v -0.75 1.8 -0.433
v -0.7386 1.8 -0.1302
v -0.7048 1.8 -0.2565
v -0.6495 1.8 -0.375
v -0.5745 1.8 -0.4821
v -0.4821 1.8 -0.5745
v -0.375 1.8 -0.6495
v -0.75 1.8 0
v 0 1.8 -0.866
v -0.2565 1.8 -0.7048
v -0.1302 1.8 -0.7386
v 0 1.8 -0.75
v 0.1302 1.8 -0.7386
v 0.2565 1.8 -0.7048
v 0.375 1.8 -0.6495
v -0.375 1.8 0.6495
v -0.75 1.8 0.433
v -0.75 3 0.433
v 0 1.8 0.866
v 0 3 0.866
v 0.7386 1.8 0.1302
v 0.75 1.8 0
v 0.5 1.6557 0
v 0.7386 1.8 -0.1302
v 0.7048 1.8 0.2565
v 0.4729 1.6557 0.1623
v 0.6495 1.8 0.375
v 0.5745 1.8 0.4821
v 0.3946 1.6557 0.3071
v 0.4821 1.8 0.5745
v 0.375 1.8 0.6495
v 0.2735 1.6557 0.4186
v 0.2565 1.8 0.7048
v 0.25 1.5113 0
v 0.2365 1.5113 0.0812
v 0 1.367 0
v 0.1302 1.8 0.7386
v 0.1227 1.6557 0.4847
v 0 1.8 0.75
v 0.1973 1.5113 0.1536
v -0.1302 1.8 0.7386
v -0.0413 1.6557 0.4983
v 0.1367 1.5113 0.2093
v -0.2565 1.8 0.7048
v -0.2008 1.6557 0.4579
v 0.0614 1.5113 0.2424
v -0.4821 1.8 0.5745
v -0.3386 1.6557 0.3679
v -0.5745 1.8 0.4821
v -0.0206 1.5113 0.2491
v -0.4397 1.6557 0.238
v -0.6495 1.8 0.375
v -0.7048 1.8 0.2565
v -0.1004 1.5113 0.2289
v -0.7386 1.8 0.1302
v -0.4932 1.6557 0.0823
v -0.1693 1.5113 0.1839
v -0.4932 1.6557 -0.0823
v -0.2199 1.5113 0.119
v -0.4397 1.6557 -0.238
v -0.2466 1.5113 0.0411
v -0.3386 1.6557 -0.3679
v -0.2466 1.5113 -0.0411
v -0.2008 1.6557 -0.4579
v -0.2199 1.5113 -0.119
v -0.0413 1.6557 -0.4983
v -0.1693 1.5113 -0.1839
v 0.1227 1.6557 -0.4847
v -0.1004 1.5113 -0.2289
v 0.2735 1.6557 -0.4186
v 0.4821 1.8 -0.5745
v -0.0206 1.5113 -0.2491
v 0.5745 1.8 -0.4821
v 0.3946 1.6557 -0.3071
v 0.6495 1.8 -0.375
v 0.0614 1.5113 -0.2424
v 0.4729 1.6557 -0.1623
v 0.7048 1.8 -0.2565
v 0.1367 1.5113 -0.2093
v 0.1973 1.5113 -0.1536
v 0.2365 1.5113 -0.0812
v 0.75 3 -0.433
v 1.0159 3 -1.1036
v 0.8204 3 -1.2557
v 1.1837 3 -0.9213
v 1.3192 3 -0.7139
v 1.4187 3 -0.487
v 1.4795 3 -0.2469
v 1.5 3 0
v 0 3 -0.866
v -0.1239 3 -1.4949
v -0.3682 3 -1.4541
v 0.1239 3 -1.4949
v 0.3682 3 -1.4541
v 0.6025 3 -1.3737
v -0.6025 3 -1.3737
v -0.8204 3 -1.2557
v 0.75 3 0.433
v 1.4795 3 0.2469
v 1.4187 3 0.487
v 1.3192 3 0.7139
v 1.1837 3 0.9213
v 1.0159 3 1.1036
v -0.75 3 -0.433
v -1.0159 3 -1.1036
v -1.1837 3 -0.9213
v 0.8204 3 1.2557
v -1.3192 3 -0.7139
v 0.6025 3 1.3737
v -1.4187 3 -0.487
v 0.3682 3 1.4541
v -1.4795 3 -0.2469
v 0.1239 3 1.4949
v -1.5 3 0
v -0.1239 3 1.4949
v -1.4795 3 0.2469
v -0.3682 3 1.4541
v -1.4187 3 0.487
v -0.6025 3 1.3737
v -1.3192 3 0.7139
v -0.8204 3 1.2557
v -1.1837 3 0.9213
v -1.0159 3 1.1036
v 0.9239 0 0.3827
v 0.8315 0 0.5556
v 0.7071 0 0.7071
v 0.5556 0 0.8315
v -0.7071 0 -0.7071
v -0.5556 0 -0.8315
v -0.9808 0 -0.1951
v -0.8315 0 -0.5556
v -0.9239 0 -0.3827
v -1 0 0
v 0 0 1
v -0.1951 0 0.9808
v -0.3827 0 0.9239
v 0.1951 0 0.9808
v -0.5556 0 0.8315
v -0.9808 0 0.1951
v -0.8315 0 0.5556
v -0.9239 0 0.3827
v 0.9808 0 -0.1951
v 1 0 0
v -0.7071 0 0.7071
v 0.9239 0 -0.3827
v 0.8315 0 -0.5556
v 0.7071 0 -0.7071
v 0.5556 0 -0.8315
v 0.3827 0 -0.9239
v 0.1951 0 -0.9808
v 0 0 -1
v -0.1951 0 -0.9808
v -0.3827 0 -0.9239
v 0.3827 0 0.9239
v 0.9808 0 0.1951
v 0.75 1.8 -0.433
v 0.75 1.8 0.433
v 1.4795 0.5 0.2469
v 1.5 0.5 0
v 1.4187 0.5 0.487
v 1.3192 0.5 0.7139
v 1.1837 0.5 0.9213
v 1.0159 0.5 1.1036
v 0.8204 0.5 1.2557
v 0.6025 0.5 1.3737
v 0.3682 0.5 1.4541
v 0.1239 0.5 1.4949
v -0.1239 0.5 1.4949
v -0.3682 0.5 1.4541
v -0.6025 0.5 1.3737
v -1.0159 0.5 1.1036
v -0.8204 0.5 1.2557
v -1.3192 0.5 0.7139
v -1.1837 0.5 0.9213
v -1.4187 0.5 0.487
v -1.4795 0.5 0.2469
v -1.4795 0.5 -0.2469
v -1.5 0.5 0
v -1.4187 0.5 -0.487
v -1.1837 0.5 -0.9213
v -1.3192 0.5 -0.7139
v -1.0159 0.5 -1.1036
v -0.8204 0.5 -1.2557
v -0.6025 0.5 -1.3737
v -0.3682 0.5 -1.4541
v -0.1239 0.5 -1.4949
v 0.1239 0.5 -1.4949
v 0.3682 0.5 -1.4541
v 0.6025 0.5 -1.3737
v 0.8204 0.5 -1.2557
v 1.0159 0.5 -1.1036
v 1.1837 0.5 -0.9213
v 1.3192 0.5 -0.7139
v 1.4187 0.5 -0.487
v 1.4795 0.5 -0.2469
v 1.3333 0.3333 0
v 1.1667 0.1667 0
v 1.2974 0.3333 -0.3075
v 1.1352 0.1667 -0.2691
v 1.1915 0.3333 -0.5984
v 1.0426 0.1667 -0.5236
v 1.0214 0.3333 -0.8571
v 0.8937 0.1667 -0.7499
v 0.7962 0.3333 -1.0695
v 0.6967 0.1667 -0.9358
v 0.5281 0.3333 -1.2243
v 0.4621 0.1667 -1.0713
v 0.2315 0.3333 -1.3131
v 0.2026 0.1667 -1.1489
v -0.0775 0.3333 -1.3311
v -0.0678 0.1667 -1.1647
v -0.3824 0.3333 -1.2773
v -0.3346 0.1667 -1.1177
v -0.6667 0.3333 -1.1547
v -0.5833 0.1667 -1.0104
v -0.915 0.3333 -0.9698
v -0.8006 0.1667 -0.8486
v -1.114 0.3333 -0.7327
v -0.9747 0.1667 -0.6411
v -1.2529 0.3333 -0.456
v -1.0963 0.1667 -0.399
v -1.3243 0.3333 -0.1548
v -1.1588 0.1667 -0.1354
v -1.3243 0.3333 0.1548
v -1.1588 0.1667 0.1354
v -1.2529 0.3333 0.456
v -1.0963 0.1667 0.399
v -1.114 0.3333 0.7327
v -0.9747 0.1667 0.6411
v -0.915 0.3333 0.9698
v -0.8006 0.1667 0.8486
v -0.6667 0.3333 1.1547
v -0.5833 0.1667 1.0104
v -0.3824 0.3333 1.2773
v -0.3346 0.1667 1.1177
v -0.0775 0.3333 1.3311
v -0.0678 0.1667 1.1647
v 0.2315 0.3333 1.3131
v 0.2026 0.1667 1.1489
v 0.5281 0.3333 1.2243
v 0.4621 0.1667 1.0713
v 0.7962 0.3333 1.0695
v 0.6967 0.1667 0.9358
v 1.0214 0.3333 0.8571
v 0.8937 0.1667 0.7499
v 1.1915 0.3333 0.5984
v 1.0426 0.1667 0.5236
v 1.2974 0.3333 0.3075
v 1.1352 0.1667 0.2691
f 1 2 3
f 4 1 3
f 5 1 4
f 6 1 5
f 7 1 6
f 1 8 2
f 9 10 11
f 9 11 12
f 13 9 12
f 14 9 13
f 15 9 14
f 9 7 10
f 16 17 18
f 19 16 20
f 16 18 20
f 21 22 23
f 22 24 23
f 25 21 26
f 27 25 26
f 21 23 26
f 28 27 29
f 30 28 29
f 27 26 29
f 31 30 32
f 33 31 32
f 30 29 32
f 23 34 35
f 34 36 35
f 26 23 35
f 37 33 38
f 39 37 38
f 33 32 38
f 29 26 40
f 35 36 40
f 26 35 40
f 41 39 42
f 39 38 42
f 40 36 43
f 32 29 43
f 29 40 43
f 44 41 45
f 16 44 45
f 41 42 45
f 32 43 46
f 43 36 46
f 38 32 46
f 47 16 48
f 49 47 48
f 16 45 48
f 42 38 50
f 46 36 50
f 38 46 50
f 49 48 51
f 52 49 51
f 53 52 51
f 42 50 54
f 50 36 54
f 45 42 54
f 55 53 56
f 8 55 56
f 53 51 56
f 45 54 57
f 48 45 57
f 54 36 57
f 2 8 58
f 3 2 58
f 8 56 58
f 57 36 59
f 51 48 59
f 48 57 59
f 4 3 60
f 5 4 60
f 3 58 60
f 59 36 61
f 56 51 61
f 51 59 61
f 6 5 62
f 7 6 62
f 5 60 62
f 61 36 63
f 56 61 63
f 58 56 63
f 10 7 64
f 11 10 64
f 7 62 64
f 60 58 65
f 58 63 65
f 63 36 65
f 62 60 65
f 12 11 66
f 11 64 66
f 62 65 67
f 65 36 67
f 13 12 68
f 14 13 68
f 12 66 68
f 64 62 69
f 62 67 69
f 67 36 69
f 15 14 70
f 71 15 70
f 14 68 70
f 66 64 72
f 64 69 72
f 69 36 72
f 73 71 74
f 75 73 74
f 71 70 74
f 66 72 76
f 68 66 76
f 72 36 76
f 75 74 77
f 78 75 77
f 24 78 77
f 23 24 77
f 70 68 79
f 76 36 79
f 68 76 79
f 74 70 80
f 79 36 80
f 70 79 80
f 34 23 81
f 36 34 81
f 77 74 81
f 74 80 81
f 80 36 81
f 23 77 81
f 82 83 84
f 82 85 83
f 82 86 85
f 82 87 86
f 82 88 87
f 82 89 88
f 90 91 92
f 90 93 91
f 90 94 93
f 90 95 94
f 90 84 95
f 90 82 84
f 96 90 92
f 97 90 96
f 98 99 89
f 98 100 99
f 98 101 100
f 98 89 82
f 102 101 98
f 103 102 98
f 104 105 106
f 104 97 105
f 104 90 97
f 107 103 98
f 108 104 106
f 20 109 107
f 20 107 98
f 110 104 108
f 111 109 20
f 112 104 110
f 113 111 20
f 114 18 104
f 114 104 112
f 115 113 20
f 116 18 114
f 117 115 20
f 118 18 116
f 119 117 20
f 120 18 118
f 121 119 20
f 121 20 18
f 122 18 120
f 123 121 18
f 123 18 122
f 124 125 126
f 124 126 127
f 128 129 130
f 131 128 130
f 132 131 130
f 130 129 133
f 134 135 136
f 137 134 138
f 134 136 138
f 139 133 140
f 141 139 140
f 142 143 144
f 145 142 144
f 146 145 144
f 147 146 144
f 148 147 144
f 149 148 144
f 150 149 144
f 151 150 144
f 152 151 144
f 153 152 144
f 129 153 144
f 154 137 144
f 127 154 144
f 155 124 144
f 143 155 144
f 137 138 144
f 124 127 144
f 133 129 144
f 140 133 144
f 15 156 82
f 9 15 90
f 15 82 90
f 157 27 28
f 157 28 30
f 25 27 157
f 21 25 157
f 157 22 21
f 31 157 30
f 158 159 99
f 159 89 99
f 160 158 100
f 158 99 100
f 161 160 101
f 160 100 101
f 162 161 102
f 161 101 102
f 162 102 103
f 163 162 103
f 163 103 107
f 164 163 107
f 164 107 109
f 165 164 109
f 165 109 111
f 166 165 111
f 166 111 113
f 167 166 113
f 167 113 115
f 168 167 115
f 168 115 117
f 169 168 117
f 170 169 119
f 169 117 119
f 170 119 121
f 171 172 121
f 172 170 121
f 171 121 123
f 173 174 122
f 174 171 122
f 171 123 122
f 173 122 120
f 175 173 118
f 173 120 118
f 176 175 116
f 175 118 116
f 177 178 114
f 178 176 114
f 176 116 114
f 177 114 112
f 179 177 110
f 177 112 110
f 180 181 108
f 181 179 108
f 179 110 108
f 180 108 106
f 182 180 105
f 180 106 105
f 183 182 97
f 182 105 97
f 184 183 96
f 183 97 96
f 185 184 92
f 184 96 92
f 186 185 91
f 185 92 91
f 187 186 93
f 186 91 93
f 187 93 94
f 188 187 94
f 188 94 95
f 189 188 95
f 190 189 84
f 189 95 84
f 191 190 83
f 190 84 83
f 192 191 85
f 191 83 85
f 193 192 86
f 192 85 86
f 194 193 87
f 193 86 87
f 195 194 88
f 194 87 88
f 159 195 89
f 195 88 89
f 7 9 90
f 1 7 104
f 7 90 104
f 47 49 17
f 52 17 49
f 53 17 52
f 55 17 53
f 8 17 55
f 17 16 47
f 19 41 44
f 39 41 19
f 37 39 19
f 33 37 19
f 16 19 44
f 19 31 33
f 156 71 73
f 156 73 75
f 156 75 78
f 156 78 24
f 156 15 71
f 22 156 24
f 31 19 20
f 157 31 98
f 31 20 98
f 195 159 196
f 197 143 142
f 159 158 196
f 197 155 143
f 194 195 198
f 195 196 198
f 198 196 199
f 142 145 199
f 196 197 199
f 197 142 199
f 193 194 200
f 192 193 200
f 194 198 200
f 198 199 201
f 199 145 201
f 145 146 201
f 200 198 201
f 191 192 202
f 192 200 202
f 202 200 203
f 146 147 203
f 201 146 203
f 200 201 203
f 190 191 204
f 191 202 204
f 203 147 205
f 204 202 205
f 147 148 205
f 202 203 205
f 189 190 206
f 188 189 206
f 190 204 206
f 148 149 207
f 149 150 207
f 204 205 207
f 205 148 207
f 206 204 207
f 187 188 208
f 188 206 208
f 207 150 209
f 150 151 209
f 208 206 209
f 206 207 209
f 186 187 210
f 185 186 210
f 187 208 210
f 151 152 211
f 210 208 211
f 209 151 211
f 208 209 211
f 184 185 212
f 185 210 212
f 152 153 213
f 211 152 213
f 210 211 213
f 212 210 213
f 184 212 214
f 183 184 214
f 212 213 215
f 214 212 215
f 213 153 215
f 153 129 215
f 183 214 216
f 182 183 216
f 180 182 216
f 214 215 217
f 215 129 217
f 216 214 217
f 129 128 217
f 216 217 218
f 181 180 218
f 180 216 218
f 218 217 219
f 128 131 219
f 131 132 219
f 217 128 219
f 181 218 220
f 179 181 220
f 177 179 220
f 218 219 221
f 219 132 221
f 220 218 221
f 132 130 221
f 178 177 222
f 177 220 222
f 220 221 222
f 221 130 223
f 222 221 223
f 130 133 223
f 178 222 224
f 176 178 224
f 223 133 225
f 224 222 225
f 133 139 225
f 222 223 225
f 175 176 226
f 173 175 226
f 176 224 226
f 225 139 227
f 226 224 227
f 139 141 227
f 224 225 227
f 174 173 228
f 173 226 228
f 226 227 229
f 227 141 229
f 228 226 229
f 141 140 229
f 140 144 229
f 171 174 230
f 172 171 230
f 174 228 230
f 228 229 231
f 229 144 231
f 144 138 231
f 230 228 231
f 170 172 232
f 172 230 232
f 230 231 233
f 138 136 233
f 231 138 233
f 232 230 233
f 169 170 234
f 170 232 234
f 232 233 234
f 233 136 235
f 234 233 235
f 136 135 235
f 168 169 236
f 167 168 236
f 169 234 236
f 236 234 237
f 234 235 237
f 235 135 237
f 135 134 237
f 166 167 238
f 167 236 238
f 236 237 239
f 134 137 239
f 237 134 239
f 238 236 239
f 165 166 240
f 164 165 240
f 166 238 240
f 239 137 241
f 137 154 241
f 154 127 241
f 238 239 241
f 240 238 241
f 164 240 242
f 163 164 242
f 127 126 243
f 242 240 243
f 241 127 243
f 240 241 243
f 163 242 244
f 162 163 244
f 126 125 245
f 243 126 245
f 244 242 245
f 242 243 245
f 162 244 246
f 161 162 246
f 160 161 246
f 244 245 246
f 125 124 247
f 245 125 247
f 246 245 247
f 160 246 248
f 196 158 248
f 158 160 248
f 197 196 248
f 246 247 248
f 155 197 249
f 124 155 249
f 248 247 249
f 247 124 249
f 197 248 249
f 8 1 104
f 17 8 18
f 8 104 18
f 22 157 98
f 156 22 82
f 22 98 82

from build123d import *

# Parameters (mm, degrees)
SKETCH1_W          = 1.5
SKETCH1_H          = 3
CUT_EXTRUDE1_DEPTH = 1.2


with BuildPart() as part:
    # Sketch1 → Revolve1 (revolve)
    with BuildSketch(Plane.XY):
        with Locations((0.75, 1.5)):
            Rectangle(SKETCH1_W, SKETCH1_H)
    revolve(axis=Axis((0, 3, 0), (0, -1, 0)))

    # Sketch2 → Cut-Revolve1 (revolve, cut)
    with BuildSketch(Plane.XY):
        Polygon((0, 3), (0.75, 3), (0.75, 1.8), (0, 1.366987298), align=None)
    revolve(axis=Axis((0, 3, 0), (0, -1, 0)), mode=Mode.SUBTRACT)

    # Sketch3 → Cut-Extrude1 (cut)
    with BuildSketch(Plane(origin=(0, 3, 0), x_dir=(1, 0, 0), z_dir=(0, 1, 0))):
        Polygon((0, 0.866025404), (-0.75, 0.433012702), (-0.75, -0.433012702), (0, -0.866025404), (0.75, -0.433012702), (0.75, 0.433012702), align=None)
    extrude(amount=-CUT_EXTRUDE1_DEPTH, mode=Mode.SUBTRACT)

    # Sketch4 → Cut-Revolve2 (revolve, cut)
    with BuildSketch(Plane.XY):
        Polygon((1, 0), (1.5, 0), (1.5, 0.5), align=None)
    revolve(axis=Axis((0, 0, 0), (0, 1, 0)), mode=Mode.SUBTRACT)


solid = part.part
